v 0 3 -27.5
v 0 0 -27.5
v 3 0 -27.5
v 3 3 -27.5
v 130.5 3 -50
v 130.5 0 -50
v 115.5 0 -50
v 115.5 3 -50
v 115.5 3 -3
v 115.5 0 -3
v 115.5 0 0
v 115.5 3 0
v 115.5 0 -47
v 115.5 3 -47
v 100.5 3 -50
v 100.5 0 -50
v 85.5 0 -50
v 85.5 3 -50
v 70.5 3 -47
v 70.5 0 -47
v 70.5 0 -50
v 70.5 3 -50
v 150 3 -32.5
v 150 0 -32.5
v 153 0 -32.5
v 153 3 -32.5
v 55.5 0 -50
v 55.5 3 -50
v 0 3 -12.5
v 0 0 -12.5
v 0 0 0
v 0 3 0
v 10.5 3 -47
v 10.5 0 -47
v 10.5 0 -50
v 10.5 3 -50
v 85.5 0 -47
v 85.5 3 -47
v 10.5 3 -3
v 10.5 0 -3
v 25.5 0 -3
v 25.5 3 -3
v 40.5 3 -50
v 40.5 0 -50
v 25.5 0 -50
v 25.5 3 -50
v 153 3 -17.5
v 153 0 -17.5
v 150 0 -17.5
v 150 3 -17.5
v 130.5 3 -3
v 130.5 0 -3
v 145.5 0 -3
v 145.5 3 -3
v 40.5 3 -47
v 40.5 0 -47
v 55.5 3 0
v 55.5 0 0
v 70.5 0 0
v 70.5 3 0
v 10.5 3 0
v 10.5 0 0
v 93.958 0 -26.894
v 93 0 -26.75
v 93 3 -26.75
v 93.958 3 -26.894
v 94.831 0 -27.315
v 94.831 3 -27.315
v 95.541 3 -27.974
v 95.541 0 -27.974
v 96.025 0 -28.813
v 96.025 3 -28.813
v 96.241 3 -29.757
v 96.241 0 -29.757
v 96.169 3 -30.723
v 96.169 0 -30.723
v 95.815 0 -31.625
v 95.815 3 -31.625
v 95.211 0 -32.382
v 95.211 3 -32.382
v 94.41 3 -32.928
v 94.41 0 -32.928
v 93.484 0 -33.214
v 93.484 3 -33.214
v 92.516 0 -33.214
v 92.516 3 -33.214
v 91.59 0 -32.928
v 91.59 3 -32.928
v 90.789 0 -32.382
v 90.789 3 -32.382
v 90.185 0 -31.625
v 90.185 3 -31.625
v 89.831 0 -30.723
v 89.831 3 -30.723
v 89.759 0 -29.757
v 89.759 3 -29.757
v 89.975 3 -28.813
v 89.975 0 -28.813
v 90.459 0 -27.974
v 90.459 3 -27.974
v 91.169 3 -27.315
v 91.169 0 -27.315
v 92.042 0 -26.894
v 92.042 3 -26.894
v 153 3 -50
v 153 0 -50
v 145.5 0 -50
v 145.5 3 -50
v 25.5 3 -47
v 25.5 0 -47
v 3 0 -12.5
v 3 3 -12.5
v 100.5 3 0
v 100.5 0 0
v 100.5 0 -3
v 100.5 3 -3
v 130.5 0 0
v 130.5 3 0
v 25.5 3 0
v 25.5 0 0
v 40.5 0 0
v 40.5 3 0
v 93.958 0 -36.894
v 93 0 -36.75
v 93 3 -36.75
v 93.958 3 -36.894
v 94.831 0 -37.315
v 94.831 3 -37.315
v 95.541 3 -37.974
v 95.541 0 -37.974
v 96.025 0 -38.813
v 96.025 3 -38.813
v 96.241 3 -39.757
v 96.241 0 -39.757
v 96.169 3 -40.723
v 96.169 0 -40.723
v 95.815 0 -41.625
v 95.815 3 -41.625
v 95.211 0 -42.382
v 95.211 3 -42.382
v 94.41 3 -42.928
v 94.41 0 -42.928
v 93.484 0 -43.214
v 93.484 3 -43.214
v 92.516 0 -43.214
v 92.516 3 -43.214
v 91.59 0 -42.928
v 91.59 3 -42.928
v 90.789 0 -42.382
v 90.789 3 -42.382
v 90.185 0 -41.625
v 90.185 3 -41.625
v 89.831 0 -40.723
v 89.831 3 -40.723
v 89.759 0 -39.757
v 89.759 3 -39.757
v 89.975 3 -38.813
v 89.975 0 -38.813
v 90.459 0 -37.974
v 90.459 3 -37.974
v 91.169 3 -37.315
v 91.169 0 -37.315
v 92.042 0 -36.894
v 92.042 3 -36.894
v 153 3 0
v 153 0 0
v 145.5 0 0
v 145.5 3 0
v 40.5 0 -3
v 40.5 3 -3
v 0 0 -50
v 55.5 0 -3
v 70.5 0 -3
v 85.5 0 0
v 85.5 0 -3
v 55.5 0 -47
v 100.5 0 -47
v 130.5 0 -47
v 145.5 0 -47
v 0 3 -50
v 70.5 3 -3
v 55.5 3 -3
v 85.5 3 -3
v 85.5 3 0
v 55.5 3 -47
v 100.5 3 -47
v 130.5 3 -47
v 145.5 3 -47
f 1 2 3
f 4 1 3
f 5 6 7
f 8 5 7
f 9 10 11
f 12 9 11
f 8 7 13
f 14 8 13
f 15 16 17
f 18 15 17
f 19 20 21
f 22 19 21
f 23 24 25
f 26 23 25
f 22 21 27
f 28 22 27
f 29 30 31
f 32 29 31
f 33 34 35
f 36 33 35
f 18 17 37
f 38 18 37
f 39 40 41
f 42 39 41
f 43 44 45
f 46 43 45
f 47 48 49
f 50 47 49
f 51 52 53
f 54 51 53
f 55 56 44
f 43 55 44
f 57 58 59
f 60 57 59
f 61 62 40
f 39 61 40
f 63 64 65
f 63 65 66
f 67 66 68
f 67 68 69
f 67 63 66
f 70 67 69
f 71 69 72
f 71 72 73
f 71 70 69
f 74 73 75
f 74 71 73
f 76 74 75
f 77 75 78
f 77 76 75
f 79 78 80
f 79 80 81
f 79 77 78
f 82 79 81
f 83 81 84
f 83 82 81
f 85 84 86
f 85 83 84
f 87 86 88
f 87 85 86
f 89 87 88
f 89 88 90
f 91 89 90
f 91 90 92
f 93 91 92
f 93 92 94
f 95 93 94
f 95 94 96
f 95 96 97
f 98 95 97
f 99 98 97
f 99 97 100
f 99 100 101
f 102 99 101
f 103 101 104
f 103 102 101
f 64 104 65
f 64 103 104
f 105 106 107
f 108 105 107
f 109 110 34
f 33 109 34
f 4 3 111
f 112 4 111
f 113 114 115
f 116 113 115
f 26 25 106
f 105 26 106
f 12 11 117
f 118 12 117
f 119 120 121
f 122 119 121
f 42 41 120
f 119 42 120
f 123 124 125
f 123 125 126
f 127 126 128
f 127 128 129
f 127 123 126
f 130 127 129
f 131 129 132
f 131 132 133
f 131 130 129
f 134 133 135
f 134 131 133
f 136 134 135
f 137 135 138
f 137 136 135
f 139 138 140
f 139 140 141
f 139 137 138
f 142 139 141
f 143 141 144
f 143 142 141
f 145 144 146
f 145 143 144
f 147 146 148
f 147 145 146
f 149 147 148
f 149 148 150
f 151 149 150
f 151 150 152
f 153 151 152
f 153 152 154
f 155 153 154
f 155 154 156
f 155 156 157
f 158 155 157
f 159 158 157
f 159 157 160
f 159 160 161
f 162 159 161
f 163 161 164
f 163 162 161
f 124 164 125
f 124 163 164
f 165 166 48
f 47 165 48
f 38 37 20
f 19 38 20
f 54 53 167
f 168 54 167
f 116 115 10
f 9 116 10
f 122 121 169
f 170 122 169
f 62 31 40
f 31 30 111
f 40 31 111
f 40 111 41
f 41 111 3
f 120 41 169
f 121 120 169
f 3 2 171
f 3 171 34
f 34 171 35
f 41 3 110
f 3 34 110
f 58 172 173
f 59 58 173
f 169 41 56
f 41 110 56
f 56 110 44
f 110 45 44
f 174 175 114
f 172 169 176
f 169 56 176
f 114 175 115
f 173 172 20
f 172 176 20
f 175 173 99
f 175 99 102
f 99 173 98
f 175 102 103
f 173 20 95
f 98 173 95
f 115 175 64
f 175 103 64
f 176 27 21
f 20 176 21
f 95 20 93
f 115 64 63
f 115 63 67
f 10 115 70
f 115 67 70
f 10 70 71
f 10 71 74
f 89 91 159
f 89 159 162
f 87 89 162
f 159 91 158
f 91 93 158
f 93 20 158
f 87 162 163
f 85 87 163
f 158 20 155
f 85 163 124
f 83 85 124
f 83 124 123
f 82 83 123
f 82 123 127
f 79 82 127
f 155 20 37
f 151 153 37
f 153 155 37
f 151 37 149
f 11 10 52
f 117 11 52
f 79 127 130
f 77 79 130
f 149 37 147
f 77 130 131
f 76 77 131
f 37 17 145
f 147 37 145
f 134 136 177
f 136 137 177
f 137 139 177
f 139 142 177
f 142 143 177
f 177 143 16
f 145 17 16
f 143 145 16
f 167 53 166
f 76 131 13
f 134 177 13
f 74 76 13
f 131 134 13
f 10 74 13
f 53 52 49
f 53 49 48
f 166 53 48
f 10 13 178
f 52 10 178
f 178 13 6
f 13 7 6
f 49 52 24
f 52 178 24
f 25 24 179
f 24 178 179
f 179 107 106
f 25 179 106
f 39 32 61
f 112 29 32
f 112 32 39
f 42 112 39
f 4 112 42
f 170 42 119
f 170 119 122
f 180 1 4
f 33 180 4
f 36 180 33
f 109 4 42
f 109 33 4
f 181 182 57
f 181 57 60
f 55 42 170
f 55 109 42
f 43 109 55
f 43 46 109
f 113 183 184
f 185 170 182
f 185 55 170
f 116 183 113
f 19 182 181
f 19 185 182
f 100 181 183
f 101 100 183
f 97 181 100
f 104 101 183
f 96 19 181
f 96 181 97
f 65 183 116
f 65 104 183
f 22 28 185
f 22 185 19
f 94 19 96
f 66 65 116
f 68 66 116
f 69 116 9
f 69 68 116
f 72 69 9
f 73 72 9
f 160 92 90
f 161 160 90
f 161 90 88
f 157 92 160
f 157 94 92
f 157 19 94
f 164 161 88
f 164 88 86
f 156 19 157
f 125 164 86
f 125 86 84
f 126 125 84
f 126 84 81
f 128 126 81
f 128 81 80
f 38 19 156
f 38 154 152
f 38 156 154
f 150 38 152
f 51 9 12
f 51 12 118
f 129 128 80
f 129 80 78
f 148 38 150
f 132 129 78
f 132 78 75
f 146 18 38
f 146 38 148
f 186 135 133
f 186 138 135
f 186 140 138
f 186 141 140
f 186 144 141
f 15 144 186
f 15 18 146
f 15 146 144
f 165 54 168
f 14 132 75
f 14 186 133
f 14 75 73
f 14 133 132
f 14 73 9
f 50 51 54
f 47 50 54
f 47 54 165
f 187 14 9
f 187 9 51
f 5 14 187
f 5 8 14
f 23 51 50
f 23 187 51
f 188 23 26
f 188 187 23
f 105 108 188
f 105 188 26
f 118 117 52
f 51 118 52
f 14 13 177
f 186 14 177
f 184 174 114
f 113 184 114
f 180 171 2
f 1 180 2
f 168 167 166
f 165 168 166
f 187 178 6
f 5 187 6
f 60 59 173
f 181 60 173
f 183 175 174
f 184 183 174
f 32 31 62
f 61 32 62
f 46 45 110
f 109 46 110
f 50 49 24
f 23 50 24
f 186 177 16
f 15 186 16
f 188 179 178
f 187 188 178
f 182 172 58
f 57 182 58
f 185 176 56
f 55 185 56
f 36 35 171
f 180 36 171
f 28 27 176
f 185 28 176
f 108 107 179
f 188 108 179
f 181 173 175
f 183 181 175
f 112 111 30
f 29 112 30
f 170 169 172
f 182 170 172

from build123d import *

# Parameters (mm, degrees)
CROQUIS1_R              = 3.25
SALIENTE_EXTRUIR1_DEPTH = 3


with BuildPart() as part:
    # Croquis1 → Saliente-Extruir1 (new body)
    with BuildSketch(Plane(origin=(0, 0, 0), x_dir=(1, 0, 0), z_dir=(0, 1, 0))):
        Polygon((0, 12.5), (0, 0), (10.5, 0), (10.5, 3), (25.5, 3), (25.5, 0), (40.5, 0), (40.5, 3), (55.5, 3), (55.5, 0), (70.5, 0), (70.5, 3), (85.5, 3), (85.5, 0), (100.5, 0), (100.5, 3), (115.5, 3), (115.5, 0), (130.5, 0), (130.5, 3), (145.5, 3), (145.5, 0), (153, 0), (153, 17.5), (150, 17.5), (150, 25), (150, 32.5), (153, 32.5), (153, 50), (145.5, 50), (145.5, 47), (130.5, 47), (130.5, 50), (115.5, 50), (115.5, 47), (100.5, 47), (100.5, 50), (93, 50), (85.5, 50), (85.5, 47), (70.5, 47), (70.5, 50), (67.60876348, 50), (55.5, 50), (55.5, 47), (40.5, 47), (40.5, 50), (25.5, 50), (25.5, 47), (10.5, 47), (10.5, 50), (3, 50), (0, 50), (0, 40), (0, 27.5), (3, 27.5), (3, 20), (3, 12.5), align=None)
        with Locations(Location((93, 30, 0), (0, 0, 270))):
            Circle(CROQUIS1_R, mode=Mode.SUBTRACT)
        with Locations(Location((93, 40, 0), (0, 0, 270))):
            Circle(CROQUIS1_R, mode=Mode.SUBTRACT)
    extrude(amount=SALIENTE_EXTRUIR1_DEPTH)


solid = part.part
